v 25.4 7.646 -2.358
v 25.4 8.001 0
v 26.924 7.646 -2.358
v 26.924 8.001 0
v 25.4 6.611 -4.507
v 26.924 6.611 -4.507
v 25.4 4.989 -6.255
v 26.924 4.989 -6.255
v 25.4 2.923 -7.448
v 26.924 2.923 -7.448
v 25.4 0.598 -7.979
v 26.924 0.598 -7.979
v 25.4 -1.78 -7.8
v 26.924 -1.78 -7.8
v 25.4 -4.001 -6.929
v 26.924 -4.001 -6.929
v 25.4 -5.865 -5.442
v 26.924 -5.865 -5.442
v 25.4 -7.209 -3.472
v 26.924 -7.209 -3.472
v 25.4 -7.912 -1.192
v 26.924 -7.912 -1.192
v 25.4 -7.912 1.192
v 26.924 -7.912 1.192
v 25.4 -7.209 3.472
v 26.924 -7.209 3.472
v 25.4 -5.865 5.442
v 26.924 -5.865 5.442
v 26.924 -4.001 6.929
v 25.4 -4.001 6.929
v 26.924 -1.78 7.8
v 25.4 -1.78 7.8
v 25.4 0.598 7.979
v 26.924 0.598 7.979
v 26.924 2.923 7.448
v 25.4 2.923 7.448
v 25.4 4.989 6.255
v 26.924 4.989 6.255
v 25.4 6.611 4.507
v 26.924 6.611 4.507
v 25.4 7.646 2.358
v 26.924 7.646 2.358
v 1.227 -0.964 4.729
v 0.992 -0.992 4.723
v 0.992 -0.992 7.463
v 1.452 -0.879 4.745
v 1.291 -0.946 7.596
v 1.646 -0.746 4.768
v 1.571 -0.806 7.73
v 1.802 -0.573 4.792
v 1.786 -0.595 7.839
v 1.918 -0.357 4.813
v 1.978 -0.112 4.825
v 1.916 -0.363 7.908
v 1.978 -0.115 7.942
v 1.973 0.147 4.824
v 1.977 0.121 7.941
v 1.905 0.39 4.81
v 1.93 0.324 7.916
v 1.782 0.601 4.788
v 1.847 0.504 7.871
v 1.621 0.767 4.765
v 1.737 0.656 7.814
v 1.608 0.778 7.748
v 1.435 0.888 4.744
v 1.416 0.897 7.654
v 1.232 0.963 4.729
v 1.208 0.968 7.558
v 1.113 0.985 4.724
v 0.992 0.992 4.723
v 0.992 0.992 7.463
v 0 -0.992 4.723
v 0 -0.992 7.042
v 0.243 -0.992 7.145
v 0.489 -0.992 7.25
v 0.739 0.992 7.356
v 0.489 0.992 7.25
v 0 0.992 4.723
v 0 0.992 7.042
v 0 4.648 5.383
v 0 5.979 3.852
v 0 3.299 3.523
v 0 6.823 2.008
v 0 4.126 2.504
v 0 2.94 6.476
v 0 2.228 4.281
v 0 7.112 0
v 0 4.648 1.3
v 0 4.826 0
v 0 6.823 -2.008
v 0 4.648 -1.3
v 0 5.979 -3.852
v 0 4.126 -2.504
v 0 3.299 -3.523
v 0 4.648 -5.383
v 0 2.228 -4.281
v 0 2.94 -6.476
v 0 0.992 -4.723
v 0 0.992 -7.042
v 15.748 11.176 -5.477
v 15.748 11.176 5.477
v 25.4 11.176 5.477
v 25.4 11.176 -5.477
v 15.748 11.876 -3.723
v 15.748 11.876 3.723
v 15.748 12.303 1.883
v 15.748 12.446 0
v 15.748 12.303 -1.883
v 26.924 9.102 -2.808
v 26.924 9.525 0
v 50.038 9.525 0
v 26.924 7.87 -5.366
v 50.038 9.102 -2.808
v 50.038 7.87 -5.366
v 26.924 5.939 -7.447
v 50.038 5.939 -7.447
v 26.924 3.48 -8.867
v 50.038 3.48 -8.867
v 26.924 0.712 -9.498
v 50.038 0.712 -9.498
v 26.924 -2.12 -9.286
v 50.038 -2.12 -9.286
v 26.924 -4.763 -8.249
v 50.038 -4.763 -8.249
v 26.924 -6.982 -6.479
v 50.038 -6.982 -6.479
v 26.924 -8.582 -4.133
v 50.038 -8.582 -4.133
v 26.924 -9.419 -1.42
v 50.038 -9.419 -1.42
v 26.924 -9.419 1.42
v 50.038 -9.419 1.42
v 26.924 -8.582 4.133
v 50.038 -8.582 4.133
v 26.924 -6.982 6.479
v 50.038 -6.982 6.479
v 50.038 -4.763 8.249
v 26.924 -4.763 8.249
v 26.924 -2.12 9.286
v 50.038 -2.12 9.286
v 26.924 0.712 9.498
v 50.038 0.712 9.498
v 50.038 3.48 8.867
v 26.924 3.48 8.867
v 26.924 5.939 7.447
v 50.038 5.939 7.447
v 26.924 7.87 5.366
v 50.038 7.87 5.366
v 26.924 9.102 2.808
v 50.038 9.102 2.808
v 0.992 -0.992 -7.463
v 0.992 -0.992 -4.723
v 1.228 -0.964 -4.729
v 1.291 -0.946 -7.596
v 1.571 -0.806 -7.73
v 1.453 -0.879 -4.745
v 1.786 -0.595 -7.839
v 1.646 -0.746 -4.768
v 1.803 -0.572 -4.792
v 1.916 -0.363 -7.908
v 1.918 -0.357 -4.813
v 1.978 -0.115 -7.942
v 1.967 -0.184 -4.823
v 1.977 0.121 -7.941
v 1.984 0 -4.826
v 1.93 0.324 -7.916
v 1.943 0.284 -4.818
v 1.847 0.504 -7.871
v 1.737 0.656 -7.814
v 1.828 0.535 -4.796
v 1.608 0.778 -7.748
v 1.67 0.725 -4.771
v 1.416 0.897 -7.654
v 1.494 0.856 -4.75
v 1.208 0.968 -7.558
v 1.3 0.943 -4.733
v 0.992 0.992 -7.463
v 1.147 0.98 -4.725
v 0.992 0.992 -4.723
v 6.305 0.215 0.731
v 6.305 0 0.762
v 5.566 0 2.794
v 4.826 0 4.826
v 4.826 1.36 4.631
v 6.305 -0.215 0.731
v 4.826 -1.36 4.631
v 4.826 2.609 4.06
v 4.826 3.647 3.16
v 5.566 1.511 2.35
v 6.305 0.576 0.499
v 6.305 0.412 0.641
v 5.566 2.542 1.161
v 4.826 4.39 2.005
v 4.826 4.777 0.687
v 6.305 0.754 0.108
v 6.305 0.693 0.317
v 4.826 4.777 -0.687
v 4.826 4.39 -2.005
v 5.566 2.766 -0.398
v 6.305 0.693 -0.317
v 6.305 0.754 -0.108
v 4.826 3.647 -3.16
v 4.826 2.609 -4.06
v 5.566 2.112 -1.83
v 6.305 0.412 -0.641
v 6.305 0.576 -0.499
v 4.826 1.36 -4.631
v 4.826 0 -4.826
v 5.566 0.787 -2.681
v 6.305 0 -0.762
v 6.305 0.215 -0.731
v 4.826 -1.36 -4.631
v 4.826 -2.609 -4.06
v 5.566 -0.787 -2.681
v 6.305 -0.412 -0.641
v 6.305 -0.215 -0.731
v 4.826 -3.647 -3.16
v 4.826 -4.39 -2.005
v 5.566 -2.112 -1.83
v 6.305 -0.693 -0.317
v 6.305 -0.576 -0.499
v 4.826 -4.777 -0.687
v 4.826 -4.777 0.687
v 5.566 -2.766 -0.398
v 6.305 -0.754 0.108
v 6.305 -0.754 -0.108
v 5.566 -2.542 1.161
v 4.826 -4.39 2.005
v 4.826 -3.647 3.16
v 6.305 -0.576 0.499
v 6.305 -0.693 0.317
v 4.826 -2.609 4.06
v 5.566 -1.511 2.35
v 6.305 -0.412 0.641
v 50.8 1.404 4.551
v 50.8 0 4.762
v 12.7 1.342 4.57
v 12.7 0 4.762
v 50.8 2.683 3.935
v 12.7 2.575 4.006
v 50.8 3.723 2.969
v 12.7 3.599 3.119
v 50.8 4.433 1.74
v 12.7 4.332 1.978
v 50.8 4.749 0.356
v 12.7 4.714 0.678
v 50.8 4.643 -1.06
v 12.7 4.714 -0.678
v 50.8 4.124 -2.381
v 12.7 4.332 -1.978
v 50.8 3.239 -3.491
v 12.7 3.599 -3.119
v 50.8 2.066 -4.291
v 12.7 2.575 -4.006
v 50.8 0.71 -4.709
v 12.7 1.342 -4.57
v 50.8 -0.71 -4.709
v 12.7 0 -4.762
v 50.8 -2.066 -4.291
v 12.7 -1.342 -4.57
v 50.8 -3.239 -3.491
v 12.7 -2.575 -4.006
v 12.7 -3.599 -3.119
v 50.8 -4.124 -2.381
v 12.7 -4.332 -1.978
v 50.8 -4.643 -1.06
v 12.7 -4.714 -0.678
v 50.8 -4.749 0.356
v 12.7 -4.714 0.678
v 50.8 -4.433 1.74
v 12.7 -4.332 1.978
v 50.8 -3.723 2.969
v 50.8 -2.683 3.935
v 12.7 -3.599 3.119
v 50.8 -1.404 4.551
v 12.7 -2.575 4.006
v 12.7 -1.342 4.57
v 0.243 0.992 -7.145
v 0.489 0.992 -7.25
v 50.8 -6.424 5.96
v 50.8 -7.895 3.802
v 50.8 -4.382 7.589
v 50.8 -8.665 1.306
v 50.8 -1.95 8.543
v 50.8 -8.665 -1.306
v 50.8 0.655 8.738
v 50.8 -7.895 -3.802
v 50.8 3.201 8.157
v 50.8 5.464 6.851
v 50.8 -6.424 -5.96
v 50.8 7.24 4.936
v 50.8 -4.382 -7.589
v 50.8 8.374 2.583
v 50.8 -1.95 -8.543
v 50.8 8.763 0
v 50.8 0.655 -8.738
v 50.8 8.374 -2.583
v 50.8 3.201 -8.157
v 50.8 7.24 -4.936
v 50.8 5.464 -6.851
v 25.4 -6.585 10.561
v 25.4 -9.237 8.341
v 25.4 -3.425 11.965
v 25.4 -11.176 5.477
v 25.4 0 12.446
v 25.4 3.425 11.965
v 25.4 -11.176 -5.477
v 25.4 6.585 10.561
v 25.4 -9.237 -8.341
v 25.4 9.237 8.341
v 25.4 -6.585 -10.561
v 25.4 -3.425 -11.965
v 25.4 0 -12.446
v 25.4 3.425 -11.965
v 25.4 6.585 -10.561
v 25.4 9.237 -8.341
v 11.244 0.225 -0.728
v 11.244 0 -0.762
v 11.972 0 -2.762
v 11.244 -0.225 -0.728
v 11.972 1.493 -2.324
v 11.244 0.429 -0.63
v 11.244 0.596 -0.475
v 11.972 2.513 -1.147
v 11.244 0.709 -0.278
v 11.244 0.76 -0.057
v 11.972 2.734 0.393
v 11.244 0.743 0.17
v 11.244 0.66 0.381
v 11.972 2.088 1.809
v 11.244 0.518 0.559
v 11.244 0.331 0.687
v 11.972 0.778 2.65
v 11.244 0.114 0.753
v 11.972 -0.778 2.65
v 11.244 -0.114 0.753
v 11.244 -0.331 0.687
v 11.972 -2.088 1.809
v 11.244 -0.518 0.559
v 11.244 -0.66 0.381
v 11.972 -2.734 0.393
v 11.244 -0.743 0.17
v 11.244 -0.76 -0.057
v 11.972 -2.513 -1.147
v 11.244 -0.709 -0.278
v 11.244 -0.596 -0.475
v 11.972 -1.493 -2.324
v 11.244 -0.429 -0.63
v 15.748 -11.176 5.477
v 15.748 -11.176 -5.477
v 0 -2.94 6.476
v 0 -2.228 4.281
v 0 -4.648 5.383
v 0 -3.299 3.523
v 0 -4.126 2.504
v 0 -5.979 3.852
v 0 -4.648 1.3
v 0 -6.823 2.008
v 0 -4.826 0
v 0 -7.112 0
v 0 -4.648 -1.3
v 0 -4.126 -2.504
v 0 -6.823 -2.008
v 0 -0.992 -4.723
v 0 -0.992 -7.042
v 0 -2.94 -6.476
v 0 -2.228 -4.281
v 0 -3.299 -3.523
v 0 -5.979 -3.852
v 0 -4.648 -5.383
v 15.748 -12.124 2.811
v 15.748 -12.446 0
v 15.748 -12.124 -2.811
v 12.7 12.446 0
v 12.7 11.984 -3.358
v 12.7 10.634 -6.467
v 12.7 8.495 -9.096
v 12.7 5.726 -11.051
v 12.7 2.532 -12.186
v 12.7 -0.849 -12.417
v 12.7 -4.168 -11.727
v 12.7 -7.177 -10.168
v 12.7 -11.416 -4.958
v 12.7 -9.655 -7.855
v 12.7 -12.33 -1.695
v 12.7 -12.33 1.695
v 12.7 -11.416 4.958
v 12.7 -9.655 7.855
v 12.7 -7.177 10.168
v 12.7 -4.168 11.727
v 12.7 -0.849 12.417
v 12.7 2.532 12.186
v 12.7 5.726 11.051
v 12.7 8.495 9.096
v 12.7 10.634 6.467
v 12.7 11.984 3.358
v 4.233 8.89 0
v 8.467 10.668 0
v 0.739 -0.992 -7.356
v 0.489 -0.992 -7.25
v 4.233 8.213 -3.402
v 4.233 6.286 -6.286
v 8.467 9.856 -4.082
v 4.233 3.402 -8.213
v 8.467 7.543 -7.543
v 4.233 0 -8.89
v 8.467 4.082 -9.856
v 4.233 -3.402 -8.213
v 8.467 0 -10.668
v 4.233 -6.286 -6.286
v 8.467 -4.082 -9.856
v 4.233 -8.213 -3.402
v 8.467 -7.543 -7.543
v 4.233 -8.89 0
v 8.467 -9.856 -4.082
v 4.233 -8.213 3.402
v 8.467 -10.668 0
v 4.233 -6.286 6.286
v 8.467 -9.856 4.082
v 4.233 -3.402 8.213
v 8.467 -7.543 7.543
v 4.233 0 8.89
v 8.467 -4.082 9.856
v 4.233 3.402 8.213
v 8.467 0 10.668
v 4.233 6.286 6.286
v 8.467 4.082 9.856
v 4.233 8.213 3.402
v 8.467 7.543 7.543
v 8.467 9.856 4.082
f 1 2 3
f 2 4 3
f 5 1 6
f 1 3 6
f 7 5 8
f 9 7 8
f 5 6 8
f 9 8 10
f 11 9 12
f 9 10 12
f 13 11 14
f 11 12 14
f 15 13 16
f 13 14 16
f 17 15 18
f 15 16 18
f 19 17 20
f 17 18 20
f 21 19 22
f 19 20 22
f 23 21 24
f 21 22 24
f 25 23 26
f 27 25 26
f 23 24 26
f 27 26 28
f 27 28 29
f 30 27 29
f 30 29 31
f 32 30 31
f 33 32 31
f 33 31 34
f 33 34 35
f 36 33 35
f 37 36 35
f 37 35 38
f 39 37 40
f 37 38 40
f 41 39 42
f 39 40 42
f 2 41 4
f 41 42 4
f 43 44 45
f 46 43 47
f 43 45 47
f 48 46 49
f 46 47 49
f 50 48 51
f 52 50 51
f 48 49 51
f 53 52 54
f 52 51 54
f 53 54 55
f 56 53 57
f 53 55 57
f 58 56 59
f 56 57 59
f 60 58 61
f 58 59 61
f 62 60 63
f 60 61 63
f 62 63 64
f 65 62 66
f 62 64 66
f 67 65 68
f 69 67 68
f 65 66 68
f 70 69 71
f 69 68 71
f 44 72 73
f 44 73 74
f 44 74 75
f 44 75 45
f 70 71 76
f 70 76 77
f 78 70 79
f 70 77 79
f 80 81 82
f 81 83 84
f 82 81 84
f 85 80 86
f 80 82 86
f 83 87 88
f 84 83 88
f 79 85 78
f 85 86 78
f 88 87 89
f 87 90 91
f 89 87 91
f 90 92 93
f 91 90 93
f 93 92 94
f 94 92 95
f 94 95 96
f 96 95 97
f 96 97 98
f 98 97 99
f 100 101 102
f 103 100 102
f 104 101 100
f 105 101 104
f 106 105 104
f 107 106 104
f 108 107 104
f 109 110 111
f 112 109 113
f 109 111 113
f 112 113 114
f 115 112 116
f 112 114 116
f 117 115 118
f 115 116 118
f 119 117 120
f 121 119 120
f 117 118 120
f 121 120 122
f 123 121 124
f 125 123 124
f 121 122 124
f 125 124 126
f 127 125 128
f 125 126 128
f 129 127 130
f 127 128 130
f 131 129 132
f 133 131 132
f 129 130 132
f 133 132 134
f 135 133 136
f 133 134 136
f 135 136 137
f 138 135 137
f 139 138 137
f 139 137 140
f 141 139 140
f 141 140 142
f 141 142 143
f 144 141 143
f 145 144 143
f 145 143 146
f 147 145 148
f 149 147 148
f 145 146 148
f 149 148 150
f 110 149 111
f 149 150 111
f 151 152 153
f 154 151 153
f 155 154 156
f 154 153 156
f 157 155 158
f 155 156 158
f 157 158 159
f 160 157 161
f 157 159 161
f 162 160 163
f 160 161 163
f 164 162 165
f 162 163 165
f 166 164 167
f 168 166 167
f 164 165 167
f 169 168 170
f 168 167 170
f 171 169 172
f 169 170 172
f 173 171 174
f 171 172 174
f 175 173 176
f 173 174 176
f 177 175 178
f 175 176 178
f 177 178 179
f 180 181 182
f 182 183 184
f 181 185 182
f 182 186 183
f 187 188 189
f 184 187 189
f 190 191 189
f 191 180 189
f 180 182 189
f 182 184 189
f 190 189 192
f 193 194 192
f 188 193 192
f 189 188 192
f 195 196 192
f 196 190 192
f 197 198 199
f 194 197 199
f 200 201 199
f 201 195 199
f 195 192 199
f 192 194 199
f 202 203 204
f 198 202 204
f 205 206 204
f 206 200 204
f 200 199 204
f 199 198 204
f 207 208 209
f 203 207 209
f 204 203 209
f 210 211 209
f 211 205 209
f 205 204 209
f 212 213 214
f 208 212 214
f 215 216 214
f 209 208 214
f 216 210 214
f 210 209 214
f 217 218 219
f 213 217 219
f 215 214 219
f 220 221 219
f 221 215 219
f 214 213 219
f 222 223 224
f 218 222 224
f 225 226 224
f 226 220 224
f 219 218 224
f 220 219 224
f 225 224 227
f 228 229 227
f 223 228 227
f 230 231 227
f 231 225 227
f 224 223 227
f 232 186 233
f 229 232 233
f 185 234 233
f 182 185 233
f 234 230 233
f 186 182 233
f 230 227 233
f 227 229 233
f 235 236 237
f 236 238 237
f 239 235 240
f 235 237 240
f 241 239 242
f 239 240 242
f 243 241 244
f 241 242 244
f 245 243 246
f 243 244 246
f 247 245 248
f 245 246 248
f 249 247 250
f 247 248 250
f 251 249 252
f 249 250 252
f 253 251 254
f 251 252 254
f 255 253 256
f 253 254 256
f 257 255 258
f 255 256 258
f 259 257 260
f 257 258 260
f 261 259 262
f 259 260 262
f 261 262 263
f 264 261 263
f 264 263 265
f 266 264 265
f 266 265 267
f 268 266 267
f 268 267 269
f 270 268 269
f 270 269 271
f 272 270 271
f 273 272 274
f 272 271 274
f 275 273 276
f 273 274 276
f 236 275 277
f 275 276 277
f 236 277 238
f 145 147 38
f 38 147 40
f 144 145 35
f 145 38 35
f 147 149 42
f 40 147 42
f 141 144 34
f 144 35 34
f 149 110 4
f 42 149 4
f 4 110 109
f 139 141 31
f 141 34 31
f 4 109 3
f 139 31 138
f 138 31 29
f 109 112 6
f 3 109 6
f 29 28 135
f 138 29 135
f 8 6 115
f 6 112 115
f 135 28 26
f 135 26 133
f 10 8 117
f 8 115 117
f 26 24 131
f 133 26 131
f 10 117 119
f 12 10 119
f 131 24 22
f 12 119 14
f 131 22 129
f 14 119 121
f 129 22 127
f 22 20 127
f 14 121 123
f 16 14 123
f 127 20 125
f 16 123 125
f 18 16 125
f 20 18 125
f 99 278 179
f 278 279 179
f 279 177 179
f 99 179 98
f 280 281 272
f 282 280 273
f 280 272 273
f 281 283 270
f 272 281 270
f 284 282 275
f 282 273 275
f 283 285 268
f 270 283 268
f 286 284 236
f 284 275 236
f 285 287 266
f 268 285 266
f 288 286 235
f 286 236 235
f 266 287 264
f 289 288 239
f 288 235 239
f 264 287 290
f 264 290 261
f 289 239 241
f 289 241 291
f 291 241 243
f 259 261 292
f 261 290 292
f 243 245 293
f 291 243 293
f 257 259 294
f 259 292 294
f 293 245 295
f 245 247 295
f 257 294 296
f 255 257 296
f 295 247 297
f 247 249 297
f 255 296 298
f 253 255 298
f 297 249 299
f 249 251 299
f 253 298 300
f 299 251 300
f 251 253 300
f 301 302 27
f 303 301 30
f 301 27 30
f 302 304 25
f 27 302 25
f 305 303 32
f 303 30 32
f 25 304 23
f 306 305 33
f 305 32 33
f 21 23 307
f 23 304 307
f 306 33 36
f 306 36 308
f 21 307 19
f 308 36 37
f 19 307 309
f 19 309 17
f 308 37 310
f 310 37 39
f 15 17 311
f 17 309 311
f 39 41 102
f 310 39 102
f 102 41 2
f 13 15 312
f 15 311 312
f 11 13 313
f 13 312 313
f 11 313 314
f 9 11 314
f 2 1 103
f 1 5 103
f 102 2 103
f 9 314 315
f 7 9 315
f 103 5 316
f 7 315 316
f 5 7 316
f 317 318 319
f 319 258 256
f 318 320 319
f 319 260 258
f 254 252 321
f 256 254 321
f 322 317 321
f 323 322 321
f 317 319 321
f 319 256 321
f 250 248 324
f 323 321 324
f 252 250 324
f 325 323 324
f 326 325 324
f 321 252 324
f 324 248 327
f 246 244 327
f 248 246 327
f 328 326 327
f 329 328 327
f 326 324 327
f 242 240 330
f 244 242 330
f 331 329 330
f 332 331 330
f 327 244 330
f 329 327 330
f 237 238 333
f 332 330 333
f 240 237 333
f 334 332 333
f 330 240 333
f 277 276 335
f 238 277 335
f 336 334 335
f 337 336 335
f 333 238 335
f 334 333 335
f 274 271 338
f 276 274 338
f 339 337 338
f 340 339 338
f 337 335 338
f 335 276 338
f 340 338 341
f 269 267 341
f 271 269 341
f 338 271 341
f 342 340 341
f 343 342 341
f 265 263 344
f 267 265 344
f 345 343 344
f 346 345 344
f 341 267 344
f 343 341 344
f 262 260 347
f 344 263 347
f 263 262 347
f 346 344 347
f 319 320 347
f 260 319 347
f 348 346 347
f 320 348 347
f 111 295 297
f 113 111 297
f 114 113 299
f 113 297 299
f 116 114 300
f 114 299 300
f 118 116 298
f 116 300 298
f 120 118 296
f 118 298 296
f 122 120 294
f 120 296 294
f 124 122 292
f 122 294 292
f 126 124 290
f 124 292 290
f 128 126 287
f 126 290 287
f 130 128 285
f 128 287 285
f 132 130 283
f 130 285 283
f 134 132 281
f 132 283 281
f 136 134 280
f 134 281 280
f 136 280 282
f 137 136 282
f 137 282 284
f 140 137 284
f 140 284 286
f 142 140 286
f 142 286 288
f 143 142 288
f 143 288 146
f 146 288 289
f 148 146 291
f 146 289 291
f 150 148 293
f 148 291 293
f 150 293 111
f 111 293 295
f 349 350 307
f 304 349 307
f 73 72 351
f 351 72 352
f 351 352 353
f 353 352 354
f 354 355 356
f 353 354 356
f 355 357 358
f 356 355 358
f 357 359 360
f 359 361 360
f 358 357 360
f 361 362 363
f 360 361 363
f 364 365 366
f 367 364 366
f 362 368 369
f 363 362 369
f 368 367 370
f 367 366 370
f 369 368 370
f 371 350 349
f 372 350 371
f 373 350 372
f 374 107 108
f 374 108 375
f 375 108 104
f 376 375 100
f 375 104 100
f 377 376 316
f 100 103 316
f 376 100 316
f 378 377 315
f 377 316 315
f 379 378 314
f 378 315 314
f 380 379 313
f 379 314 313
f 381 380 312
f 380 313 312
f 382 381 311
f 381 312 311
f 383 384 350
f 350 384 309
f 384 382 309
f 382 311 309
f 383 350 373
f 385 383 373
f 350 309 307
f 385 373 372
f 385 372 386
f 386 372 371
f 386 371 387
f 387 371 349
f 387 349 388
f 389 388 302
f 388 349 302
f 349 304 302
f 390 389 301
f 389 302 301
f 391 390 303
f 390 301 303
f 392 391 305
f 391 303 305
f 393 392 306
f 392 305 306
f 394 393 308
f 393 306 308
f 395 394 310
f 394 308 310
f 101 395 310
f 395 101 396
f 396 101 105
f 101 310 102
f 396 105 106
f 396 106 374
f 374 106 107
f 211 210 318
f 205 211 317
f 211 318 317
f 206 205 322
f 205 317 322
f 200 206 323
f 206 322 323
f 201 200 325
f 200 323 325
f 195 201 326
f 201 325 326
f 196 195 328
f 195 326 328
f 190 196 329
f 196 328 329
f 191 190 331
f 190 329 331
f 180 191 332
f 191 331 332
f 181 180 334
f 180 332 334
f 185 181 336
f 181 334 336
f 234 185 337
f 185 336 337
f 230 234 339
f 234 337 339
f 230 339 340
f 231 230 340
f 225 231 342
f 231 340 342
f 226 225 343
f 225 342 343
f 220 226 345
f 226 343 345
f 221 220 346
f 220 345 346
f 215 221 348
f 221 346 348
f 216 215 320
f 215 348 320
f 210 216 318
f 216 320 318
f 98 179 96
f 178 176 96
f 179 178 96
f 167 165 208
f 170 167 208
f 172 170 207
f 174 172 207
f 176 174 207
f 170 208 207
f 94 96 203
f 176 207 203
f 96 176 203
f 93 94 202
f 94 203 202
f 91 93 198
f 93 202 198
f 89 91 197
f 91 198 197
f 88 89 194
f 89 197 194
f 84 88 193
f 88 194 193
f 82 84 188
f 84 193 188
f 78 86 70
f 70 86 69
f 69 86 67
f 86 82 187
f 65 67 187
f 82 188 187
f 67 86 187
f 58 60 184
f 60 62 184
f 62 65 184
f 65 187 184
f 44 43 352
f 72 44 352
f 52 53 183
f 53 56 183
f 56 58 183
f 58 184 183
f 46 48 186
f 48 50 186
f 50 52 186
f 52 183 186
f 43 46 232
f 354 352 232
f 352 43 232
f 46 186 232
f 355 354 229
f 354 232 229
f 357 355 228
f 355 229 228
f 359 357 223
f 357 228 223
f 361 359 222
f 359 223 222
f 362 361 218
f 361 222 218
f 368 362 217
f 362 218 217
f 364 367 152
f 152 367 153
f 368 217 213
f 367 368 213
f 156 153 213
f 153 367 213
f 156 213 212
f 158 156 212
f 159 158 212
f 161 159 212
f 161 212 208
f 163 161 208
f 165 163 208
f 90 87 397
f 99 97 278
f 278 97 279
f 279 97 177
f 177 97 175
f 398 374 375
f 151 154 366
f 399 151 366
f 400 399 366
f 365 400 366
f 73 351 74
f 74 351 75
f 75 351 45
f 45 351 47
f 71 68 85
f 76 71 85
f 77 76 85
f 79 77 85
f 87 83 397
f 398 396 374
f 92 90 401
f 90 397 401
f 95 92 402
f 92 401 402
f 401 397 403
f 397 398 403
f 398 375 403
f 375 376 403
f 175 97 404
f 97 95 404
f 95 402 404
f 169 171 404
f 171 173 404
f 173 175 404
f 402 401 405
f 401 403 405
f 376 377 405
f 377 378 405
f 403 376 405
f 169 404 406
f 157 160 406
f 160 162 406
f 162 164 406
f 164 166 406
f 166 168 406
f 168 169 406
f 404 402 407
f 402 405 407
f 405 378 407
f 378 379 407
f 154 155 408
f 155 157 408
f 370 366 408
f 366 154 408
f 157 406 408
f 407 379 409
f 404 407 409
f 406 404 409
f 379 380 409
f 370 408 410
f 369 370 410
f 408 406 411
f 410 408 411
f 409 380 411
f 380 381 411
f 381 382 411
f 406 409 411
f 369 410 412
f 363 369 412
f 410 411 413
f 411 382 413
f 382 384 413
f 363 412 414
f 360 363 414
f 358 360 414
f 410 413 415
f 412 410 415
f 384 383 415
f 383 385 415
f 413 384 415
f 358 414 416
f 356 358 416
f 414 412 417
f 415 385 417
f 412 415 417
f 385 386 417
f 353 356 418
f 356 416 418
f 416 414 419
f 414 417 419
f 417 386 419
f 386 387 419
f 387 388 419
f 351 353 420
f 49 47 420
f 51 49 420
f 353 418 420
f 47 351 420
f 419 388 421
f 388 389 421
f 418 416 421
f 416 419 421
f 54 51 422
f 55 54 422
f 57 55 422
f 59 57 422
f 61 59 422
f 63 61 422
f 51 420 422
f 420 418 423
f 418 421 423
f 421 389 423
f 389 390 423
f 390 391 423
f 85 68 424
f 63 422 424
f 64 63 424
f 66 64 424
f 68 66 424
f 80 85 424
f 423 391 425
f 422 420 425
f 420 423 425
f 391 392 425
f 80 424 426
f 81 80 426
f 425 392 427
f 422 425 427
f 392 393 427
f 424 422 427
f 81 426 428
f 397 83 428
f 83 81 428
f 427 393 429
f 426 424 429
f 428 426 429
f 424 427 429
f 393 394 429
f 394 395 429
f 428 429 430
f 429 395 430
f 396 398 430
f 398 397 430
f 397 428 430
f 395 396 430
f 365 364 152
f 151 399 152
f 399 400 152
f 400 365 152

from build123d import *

# Parameters (mm, degrees)
CHAMFER1_SIZE                    = 0.762
F_3_8_0_375_DIAMETER_HOLE1_D     = 9.525
F_3_8_0_375_DIAMETER_HOLE1_DEPTH = 38.1
F_3_8_0_375_DIAMETER_HOLE1_TIP   = 1.733408241
F_3_8_0_375_DIAMETER_HOLE2_D     = 1.524
F_3_8_0_375_DIAMETER_HOLE2_DEPTH = 38.1
F_3_8_0_375_DIAMETER_HOLE2_TIP   = 0.277345319
F_3_8_0_375_DIAMETER_HOLE3_D     = 9.652
F_3_8_0_375_DIAMETER_HOLE3_DEPTH = 4.826
F_3_8_0_375_DIAMETER_HOLE3_TIP   = 1.756520351
EXTRUDE1_DEPTH                   = 25.4
EXTRUDE1_DEPTH_BACK              = 25.4
SKETCH10_W                       = 9.652
SKETCH10_H                       = 2.627899037
SKETCH10_H_2                     = 6.35
CUT_EXTRUDE1_DEPTH               = 12.7


with BuildPart() as part:
    # Sketch1 → Revolve1 (revolve)
    with BuildSketch(Plane.XY):
        Polygon((0, 0), (0, 7.112), (12.7, 12.446), (25.4, 12.446), (25.4, 8.001), (26.924, 8.001), (26.924, 9.525), (50.8, 9.525), (50.8, 0), align=None)
    revolve(axis=Axis((50.8, 0, 0), (-1, 0, 0)))

    # Chamfer1
    chamfer1_edges = [part.edges().sort_by_distance(p)[0] for p in [
        (50.8, -9.525, 0),
    ]]
    chamfer(chamfer1_edges, length=CHAMFER1_SIZE)

    # 3/8 (0.375) Diameter Hole1
    with Locations(Plane(origin=(50.8, 0, 0), x_dir=(0, 0, -1), z_dir=(1, 0, 0))):
        with Locations((0, 0)):
            Hole(F_3_8_0_375_DIAMETER_HOLE1_D / 2, depth=F_3_8_0_375_DIAMETER_HOLE1_DEPTH)
            with Locations((0, 0, -(F_3_8_0_375_DIAMETER_HOLE1_DEPTH + F_3_8_0_375_DIAMETER_HOLE1_TIP / 2))):  # 140° drill point
                Cone(0, F_3_8_0_375_DIAMETER_HOLE1_D / 2, F_3_8_0_375_DIAMETER_HOLE1_TIP, mode=Mode.SUBTRACT)

    # 3/8 (0.375) Diameter Hole2
    with Locations(Plane.ZY):
        with Locations((0, 0)):
            Hole(F_3_8_0_375_DIAMETER_HOLE2_D / 2, depth=F_3_8_0_375_DIAMETER_HOLE2_DEPTH)
            with Locations((0, 0, -(F_3_8_0_375_DIAMETER_HOLE2_DEPTH + F_3_8_0_375_DIAMETER_HOLE2_TIP / 2))):  # 140° drill point
                Cone(0, F_3_8_0_375_DIAMETER_HOLE2_D / 2, F_3_8_0_375_DIAMETER_HOLE2_TIP, mode=Mode.SUBTRACT)

    # 3/8 (0.375) Diameter Hole3
    with Locations(Plane.ZY):
        with Locations((0, 0)):
            Hole(F_3_8_0_375_DIAMETER_HOLE3_D / 2, depth=F_3_8_0_375_DIAMETER_HOLE3_DEPTH)
            with Locations((0, 0, -(F_3_8_0_375_DIAMETER_HOLE3_DEPTH + F_3_8_0_375_DIAMETER_HOLE3_TIP / 2))):  # 140° drill point
                Cone(0, F_3_8_0_375_DIAMETER_HOLE3_D / 2, F_3_8_0_375_DIAMETER_HOLE3_TIP, mode=Mode.SUBTRACT)

    # Sketch10 → Extrude1 (cut, two sides: drawn at the far end of the back side and taken through both)
    with BuildSketch(Plane.XY.offset(-EXTRUDE1_DEPTH_BACK)):
        with Locations((20.574, 12.489949519)):
            Rectangle(SKETCH10_W, SKETCH10_H)
        with Locations((20.574, -14.351)):
            Rectangle(SKETCH10_W, SKETCH10_H_2)
    extrude(amount=EXTRUDE1_DEPTH + EXTRUDE1_DEPTH_BACK, mode=Mode.SUBTRACT)

    # Sketch11 → Cut-Extrude1 (cut, symmetric)
    with BuildSketch(Plane.XY):
        with BuildLine():
            Line((0, 0.9921875), (0, -0.9921875))
            Line((0, -0.9921875), (0.9921875, -0.9921875))
            ThreePointArc((0.9921875, -0.9921875), (1.984375, 0), (0.9921875, 0.9921875))
            Line((0.9921875, 0.9921875), (0, 0.9921875))
        make_face()
    extrude(amount=CUT_EXTRUDE1_DEPTH, both=True, mode=Mode.SUBTRACT)


solid = part.part
